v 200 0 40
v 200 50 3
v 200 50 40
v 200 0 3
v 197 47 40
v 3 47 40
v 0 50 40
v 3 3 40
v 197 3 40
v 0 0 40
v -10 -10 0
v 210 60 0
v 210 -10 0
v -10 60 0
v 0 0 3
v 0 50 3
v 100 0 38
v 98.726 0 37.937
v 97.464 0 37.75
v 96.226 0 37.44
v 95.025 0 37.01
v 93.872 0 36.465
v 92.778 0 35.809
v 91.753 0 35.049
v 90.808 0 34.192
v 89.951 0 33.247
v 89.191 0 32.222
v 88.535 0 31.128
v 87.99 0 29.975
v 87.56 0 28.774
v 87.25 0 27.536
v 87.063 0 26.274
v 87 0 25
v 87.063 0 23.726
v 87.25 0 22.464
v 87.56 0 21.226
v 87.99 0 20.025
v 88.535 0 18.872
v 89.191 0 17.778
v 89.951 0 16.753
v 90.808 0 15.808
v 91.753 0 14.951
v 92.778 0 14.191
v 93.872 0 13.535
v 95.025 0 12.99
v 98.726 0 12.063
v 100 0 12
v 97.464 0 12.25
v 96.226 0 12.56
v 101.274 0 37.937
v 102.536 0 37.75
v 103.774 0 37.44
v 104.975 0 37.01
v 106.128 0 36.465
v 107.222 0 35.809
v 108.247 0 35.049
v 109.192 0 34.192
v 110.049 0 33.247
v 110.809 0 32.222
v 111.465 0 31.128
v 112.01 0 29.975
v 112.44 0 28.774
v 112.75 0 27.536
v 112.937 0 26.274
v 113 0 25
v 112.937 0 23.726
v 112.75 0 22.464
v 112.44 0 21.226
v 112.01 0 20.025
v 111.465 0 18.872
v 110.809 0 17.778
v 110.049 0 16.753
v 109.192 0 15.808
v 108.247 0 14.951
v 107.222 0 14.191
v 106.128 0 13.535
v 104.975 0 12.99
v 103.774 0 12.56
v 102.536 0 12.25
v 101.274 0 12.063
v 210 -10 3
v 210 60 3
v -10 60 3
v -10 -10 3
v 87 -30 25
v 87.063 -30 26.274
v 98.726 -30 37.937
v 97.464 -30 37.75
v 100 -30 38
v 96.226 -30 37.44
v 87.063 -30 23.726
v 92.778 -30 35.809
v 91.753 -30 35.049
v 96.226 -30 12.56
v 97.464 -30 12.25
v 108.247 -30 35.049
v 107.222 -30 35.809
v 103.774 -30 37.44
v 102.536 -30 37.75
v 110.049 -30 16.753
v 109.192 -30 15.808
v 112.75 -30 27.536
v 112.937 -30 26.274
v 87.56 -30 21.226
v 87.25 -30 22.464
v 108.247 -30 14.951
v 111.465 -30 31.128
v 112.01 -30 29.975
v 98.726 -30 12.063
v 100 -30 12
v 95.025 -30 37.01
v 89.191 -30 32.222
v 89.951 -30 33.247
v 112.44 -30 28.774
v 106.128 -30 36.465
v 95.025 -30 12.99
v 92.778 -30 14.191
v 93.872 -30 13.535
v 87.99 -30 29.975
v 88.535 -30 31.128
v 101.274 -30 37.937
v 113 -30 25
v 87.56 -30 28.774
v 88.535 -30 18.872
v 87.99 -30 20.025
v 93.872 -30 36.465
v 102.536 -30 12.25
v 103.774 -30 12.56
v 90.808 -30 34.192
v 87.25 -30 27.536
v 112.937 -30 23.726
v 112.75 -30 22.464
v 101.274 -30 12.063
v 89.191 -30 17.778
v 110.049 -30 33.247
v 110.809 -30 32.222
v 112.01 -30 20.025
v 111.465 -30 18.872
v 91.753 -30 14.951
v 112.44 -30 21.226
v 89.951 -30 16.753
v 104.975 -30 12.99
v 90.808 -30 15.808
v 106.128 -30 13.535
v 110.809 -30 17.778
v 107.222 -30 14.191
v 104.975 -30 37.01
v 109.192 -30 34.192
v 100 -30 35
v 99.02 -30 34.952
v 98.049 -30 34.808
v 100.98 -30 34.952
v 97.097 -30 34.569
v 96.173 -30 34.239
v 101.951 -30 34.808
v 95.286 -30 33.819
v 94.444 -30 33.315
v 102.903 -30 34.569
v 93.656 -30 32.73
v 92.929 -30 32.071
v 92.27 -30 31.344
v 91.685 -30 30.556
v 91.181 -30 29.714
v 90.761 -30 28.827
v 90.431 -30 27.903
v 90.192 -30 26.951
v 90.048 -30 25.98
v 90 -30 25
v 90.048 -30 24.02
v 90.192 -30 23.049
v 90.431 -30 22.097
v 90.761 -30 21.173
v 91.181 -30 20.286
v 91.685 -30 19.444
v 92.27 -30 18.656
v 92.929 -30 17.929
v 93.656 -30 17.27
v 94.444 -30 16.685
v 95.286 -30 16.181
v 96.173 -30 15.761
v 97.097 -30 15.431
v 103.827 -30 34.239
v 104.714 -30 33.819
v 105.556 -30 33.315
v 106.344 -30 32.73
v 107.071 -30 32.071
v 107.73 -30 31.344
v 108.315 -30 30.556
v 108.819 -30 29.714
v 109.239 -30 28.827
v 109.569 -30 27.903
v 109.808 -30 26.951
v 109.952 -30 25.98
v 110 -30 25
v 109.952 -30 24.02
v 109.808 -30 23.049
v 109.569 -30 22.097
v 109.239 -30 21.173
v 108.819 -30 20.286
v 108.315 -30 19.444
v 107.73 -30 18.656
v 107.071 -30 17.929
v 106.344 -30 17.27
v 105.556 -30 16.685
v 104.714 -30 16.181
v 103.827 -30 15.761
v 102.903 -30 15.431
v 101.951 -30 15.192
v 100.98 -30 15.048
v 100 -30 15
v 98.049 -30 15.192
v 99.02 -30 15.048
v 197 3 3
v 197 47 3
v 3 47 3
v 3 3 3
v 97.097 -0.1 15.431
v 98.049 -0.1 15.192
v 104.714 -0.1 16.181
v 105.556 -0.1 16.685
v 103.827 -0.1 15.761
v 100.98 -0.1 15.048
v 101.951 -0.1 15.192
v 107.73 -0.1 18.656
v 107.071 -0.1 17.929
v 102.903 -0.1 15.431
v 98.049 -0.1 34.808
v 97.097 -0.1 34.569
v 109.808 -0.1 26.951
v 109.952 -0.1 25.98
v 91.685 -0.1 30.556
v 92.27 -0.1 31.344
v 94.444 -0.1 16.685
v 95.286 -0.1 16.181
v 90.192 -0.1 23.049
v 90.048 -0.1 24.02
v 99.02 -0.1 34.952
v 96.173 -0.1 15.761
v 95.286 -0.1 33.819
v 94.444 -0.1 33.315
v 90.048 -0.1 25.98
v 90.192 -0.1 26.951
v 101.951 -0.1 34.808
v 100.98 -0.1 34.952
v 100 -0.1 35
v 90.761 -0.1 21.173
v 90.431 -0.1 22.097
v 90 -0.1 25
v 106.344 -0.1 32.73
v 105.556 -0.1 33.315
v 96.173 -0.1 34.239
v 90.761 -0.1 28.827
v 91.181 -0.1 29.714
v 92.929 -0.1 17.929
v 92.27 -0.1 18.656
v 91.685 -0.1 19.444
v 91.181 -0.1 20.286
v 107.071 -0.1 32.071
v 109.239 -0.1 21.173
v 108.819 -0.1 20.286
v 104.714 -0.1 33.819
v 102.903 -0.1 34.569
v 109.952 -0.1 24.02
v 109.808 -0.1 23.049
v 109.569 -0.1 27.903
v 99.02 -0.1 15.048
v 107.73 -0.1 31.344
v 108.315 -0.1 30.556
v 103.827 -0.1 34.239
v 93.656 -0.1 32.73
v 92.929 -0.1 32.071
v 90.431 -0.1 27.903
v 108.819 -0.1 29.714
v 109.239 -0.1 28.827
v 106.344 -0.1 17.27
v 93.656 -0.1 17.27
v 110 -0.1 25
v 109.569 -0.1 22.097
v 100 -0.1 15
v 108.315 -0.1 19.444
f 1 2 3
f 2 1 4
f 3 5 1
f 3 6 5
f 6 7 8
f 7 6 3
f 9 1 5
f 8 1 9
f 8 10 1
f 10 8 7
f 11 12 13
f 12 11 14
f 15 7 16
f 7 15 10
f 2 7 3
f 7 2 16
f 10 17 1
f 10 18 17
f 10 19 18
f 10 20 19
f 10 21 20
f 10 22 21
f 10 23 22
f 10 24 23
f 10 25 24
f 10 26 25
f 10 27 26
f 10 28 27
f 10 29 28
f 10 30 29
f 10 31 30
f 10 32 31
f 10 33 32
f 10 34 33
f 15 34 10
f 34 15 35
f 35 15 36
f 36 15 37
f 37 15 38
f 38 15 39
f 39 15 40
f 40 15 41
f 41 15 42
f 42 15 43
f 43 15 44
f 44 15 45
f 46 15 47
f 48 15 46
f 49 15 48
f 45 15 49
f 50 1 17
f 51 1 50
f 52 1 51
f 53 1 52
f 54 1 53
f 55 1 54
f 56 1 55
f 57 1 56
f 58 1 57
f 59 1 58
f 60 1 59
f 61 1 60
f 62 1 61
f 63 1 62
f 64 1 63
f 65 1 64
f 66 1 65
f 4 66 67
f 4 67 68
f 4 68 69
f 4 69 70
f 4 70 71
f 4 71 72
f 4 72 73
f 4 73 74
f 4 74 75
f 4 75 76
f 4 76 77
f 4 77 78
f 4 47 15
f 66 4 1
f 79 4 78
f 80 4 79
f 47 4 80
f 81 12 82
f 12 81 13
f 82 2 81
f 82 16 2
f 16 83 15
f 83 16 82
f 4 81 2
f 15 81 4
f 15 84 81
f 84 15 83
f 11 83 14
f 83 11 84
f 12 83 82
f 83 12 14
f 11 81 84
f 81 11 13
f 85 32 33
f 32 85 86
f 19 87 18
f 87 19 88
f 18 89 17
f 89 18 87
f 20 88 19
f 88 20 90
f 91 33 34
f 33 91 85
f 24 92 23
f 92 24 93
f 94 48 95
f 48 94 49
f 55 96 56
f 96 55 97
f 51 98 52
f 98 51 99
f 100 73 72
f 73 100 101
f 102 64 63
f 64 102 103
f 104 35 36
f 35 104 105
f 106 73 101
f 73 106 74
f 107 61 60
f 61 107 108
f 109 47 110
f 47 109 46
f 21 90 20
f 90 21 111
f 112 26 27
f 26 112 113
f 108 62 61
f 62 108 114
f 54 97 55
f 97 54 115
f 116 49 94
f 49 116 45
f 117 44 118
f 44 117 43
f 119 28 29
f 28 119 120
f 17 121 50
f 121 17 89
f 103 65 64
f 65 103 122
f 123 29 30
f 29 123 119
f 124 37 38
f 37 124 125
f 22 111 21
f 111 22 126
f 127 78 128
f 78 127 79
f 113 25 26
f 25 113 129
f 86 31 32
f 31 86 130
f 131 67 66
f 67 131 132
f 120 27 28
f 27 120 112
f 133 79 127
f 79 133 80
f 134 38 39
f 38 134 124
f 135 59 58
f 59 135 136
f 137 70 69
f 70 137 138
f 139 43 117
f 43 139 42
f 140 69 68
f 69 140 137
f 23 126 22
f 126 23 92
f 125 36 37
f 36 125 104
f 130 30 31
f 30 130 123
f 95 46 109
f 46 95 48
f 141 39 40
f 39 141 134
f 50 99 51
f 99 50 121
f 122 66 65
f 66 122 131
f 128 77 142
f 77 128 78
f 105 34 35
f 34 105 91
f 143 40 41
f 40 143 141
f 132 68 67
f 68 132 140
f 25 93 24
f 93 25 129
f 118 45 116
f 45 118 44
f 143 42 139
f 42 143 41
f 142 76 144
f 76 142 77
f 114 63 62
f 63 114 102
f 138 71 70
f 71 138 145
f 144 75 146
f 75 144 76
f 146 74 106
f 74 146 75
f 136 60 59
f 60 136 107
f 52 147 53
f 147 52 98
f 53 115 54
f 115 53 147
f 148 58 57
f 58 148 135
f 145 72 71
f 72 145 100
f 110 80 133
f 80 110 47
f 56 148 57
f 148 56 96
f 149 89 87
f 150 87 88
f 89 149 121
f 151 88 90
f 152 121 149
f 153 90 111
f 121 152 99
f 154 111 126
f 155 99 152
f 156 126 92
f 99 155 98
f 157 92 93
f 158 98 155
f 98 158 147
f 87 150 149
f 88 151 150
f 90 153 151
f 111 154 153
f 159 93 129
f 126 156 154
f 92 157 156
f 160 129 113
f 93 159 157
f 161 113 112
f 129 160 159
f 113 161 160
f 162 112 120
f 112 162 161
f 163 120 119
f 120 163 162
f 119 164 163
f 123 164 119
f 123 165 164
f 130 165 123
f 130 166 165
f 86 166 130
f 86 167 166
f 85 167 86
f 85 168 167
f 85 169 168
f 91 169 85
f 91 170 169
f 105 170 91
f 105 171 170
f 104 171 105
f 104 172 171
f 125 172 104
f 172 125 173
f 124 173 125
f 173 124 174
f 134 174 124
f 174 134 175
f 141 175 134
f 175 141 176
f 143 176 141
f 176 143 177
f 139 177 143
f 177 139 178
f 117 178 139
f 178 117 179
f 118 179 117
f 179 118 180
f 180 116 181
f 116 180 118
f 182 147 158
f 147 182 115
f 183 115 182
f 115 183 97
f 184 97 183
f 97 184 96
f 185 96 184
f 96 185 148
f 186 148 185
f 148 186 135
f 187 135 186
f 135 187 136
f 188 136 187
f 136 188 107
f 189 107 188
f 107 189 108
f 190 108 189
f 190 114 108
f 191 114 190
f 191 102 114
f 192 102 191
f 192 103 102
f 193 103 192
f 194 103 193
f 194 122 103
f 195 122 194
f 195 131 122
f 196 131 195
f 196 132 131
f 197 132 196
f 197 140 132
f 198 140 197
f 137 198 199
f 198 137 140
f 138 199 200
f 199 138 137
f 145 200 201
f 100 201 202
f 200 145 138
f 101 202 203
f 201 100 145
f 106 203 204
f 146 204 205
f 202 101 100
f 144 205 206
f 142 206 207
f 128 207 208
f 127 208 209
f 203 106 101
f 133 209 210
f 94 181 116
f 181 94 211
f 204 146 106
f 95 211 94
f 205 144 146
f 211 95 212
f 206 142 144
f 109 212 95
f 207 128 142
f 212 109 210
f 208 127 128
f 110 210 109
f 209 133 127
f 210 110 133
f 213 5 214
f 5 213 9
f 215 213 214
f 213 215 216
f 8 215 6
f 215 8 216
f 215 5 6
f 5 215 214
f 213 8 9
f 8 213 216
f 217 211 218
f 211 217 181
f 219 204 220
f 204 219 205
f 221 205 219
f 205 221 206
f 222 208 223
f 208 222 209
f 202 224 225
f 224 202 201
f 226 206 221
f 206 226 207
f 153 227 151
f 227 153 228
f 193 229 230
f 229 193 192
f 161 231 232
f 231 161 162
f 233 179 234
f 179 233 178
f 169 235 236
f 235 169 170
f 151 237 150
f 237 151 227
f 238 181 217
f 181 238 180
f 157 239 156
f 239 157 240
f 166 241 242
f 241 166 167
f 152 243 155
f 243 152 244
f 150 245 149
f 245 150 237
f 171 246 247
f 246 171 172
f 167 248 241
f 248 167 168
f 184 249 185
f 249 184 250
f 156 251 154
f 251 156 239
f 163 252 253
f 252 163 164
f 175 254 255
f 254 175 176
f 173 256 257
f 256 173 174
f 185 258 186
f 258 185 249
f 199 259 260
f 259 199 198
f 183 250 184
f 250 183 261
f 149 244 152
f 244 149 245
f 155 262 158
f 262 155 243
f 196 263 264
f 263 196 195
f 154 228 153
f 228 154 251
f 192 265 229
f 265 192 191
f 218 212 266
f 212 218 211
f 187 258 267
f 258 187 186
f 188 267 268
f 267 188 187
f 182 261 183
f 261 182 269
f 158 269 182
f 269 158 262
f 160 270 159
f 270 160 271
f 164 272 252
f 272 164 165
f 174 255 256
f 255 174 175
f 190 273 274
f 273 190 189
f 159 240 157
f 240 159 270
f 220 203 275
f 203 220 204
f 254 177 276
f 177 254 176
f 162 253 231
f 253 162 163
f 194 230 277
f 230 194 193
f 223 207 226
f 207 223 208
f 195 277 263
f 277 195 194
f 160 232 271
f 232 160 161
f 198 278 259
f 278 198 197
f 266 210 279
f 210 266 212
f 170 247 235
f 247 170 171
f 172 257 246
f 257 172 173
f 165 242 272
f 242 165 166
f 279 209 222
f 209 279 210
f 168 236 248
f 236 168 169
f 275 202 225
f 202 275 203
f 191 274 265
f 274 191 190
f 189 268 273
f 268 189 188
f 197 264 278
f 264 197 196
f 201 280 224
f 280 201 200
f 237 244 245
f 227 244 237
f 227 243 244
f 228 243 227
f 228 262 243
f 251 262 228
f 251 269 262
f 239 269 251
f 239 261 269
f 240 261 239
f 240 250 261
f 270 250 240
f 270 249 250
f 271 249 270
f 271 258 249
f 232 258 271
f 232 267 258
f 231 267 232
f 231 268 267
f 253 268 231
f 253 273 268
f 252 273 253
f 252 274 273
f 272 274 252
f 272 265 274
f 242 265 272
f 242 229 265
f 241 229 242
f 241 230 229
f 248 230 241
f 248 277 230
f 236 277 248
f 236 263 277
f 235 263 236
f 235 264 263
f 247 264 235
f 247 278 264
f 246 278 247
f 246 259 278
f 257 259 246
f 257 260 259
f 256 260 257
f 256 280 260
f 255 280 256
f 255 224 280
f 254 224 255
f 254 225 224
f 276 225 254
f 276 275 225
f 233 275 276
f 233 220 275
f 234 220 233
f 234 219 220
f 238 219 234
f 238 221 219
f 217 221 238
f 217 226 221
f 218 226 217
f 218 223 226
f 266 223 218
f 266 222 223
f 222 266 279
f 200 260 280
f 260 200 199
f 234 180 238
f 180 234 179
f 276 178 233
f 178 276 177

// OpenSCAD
// Generated by SolidPython 1.1.3 on 2025-03-15 19:19:50
$fn = 64;


difference() {
	union() {
		cube(size = [200, 50, 40]);
		translate(v = [-10, -10, 0]) {
			cube(size = [220, 70, 3]);
		}
		translate(v = [0, 0, 25.0000000000]) {
			translate(v = [100.0000000000, 0, 0]) {
				rotate(a = [90, 0, 0]) {
					rotate(a = [0, 0, 90]) {
						cylinder(h = 30, r = 13);
					}
				}
			}
		}
	}
	translate(v = [0, 0, 3]) {
		translate(v = [3, 3, 0]) {
			cube(size = [194, 44, 37]);
		}
	}
	translate(v = [0, 0, 25.0000000000]) {
		translate(v = [100.0000000000, -0.1000000000, 0]) {
			rotate(a = [90, 0, 0]) {
				rotate(a = [0, 0, 90]) {
					cylinder(h = 30.2000000000, r = 10);
				}
			}
		}
	}
}
/***********************************************
*********      SolidPython code:      **********
************************************************
 
import numpy as np
from solid import *
from solid.utils import *

z = 0.1
z2 = 0.2
m = 2

t = translate
tx = lambda e, x: t([x, 0, 0])(e)
ty = lambda e, x: t([0, x, 0])(e)
tz = lambda e, x: t([0, 0, x])(e)
txy = lambda e, x, y: t([x, y, 0])(e)
r = rotate
rx = lambda e, x: r([x, 0, 0])(e)
ry = lambda e, x: r([0, x, 0])(e)
rz = lambda e, x: r([0, 0, x])(e)
sc = scale
cos = np.cos
sin = np.sin
pi = np.pi
save = lambda m, n: scad_render_to_file(m, n, file_header='$fn = 64;')


# Parameters
w_fan = 140 + m # Width of fan
h_fan = 140 + m # Height of fan
d_fan = 24 + m # Depth of fan
r_fan = 134 / 2 # Radius
ox_fan_hole = 7 + m # Offset x of fan screw hole
oy_fan_hole = 7 + m # Offset y of fan screw hole
r_fan_hole = 2.5 # Radius of fan screw hole
re_fan_hole = 13 # Extra radius of fan screw hole
d_fan_hole = 5 # Depth of fan screw hole

x_ihose = 0.15 * w_fan # Offset x of hose input connector
y_ihose = 0.50 * h_fan # Offset y of hose input connector
x_ohose = 0.25 * w_fan # Offset x of hose output connector
y_ohose = 0.40 * w_fan / 2 # Offset y of hose output connector
r_hose = 13 # Radius of hose connector
m_hose = 3 # Margin of hose connector
d_hose = 30 # Depth of hose connector

# Window exhaust parameters
w_window = 200  # Width of window adapter
h_window = 50   # Height of window adapter
d_window = 40   # Depth of window adapter
t_window = 3    # Thickness of window adapter walls
f_window = 10   # Flange width for window adapter


def create_fan_box():
  d = w_fan / 2 - d_fan / 2
  fan_box = cube([w_fan, h_fan, d])
  fan = sphere(r=r_fan)
  fan = txy(fan, w_fan / 2, h_fan / 2)
  fan = tz(fan, -d_fan / 2)

  hole = cylinder(r=re_fan_hole, h=d + z2)
  hole = tz(hole, d_fan_hole)
  hole += cylinder(r=r_fan_hole, h=d + z2)
  ox, oy = ox_fan_hole, oy_fan_hole
  holes = txy(hole, ox, oy)
  holes += txy(hole, w_fan - ox, oy)
  holes += txy(hole, ox, h_fan - oy)
  holes += txy(hole, w_fan - ox, h_fan - oy)
  holes = tz(holes, -z)

  return fan_box - fan - holes


def create_fan_box_input():
  fan_box = create_fan_box()

  d = w_fan / 2 - d_fan / 2
  hose_input = cylinder(r=r_hose, h=d_hose)
  hose_input = txy(hose_input, x_ihose, y_ihose)
  hose_input = tz(hose_input, d)
  hose_input_hole = cylinder(r=r_hose - m_hose, h=d + d_hose + z2)
  hose_input_hole = txy(hose_input_hole, x_ihose, y_ihose)
  hose_input_hole = tz(hose_input_hole, -z)

  return fan_box + hose_input - hose_input_hole


def create_fan_box_output():
  fan_box = create_fan_box()

  d = w_fan / 2 - d_fan / 2
  hose_output = cylinder(r=r_hose, h=d_hose)
  hose_output = rx(hose_output, 90)
  hose_output = tx(hose_output, x_ohose)
  hose_output = tz(hose_output, y_ohose)
  hose_output_hole = cylinder(r=r_hose - m_hose, h=h_fan + d_hose + z2)
  hose_output_hole = rx(hose_output_hole, 90)
  hose_output_hole = txy(hose_output_hole, x_ohose, h_fan / 2)
  hose_output_hole = tz(hose_output_hole, y_ohose)

  return fan_box + hose_output - hose_output_hole


def create_window_exhaust():
  # Create the main body of the window adapter
  main_body = cube([w_window, h_window, d_window])
  
  # Create the hollow inside - making it slightly smaller than the outer dimensions
  hollow_width = w_window - 2*t_window
  hollow_height = h_window - 2*t_window
  hollow_depth = d_window - t_window
  hollow = cube([hollow_width, hollow_height, hollow_depth])
  hollow = txy(hollow, t_window, t_window)
  hollow = tz(hollow, t_window)
  
  # Create the flange that sits against the window
  flange = cube([w_window + 2*f_window, h_window + 2*f_window, t_window])
  flange = txy(flange, -f_window, -f_window)
  
  # Create the hose connector - positioned on the bottom side
  hose_input = cylinder(r=r_hose, h=d_hose)
  hose_input = rz(hose_input, 90)  # Rotate for proper orientation
  hose_input = rx(hose_input, 90)  # Rotate to point downward
  hose_input = txy(hose_input, w_window/2, 0)  # Position at the bottom center
  hose_input = tz(hose_input, h_window/2)  # Adjust z position
  
  # Create the hole for the hose
  hose_hole = cylinder(r=r_hose - m_hose, h=d_hose + z2)
  hose_hole = rz(hose_hole, 90)  # Rotate for proper orientation
  hose_hole = rx(hose_hole, 90)  # Rotate to point downward
  hose_hole = txy(hose_hole, w_window/2, -z)  # Position at the bottom center
  hose_hole = tz(hose_hole, h_window/2)  # Adjust z position
  
  # Combine all parts
  window_exhaust = main_body + flange + hose_input - hollow - hose_hole
  
  return window_exhaust


fan_box_input = create_fan_box_input()
fan_box_output = create_fan_box_output()
window_exhaust = create_window_exhaust()

import os
folder = os.path.basename(os.path.dirname(__file__))
save(rx(fan_box_input, 90) + ty(tz(rx(fan_box_output, -90), h_fan), d_fan), folder + ".assembly.scad")
save(fan_box_input, folder + ".fan-box-input.scad")
save(fan_box_output, folder + ".fan-box-output.scad")
save(window_exhaust, folder + ".window-exhaust.scad")

# Create a proper full assembly with correct positioning
# Position the window exhaust at an appropriate distance from the fan output
x_offset = 200  # Distance between fan output and window exhaust
y_offset = 0    # Vertical alignment
z_offset = 50   # Height alignment - raised to better align with the hose

full_assembly = rx(fan_box_input, 90) + ty(tz(rx(fan_box_output, -90), h_fan), d_fan)
# Position window exhaust to the right and adjust height
full_assembly += txy(tz(window_exhaust, z_offset), x_offset, y_offset)

save(full_assembly, folder + ".full-assembly.scad")
 
 
************************************************/
